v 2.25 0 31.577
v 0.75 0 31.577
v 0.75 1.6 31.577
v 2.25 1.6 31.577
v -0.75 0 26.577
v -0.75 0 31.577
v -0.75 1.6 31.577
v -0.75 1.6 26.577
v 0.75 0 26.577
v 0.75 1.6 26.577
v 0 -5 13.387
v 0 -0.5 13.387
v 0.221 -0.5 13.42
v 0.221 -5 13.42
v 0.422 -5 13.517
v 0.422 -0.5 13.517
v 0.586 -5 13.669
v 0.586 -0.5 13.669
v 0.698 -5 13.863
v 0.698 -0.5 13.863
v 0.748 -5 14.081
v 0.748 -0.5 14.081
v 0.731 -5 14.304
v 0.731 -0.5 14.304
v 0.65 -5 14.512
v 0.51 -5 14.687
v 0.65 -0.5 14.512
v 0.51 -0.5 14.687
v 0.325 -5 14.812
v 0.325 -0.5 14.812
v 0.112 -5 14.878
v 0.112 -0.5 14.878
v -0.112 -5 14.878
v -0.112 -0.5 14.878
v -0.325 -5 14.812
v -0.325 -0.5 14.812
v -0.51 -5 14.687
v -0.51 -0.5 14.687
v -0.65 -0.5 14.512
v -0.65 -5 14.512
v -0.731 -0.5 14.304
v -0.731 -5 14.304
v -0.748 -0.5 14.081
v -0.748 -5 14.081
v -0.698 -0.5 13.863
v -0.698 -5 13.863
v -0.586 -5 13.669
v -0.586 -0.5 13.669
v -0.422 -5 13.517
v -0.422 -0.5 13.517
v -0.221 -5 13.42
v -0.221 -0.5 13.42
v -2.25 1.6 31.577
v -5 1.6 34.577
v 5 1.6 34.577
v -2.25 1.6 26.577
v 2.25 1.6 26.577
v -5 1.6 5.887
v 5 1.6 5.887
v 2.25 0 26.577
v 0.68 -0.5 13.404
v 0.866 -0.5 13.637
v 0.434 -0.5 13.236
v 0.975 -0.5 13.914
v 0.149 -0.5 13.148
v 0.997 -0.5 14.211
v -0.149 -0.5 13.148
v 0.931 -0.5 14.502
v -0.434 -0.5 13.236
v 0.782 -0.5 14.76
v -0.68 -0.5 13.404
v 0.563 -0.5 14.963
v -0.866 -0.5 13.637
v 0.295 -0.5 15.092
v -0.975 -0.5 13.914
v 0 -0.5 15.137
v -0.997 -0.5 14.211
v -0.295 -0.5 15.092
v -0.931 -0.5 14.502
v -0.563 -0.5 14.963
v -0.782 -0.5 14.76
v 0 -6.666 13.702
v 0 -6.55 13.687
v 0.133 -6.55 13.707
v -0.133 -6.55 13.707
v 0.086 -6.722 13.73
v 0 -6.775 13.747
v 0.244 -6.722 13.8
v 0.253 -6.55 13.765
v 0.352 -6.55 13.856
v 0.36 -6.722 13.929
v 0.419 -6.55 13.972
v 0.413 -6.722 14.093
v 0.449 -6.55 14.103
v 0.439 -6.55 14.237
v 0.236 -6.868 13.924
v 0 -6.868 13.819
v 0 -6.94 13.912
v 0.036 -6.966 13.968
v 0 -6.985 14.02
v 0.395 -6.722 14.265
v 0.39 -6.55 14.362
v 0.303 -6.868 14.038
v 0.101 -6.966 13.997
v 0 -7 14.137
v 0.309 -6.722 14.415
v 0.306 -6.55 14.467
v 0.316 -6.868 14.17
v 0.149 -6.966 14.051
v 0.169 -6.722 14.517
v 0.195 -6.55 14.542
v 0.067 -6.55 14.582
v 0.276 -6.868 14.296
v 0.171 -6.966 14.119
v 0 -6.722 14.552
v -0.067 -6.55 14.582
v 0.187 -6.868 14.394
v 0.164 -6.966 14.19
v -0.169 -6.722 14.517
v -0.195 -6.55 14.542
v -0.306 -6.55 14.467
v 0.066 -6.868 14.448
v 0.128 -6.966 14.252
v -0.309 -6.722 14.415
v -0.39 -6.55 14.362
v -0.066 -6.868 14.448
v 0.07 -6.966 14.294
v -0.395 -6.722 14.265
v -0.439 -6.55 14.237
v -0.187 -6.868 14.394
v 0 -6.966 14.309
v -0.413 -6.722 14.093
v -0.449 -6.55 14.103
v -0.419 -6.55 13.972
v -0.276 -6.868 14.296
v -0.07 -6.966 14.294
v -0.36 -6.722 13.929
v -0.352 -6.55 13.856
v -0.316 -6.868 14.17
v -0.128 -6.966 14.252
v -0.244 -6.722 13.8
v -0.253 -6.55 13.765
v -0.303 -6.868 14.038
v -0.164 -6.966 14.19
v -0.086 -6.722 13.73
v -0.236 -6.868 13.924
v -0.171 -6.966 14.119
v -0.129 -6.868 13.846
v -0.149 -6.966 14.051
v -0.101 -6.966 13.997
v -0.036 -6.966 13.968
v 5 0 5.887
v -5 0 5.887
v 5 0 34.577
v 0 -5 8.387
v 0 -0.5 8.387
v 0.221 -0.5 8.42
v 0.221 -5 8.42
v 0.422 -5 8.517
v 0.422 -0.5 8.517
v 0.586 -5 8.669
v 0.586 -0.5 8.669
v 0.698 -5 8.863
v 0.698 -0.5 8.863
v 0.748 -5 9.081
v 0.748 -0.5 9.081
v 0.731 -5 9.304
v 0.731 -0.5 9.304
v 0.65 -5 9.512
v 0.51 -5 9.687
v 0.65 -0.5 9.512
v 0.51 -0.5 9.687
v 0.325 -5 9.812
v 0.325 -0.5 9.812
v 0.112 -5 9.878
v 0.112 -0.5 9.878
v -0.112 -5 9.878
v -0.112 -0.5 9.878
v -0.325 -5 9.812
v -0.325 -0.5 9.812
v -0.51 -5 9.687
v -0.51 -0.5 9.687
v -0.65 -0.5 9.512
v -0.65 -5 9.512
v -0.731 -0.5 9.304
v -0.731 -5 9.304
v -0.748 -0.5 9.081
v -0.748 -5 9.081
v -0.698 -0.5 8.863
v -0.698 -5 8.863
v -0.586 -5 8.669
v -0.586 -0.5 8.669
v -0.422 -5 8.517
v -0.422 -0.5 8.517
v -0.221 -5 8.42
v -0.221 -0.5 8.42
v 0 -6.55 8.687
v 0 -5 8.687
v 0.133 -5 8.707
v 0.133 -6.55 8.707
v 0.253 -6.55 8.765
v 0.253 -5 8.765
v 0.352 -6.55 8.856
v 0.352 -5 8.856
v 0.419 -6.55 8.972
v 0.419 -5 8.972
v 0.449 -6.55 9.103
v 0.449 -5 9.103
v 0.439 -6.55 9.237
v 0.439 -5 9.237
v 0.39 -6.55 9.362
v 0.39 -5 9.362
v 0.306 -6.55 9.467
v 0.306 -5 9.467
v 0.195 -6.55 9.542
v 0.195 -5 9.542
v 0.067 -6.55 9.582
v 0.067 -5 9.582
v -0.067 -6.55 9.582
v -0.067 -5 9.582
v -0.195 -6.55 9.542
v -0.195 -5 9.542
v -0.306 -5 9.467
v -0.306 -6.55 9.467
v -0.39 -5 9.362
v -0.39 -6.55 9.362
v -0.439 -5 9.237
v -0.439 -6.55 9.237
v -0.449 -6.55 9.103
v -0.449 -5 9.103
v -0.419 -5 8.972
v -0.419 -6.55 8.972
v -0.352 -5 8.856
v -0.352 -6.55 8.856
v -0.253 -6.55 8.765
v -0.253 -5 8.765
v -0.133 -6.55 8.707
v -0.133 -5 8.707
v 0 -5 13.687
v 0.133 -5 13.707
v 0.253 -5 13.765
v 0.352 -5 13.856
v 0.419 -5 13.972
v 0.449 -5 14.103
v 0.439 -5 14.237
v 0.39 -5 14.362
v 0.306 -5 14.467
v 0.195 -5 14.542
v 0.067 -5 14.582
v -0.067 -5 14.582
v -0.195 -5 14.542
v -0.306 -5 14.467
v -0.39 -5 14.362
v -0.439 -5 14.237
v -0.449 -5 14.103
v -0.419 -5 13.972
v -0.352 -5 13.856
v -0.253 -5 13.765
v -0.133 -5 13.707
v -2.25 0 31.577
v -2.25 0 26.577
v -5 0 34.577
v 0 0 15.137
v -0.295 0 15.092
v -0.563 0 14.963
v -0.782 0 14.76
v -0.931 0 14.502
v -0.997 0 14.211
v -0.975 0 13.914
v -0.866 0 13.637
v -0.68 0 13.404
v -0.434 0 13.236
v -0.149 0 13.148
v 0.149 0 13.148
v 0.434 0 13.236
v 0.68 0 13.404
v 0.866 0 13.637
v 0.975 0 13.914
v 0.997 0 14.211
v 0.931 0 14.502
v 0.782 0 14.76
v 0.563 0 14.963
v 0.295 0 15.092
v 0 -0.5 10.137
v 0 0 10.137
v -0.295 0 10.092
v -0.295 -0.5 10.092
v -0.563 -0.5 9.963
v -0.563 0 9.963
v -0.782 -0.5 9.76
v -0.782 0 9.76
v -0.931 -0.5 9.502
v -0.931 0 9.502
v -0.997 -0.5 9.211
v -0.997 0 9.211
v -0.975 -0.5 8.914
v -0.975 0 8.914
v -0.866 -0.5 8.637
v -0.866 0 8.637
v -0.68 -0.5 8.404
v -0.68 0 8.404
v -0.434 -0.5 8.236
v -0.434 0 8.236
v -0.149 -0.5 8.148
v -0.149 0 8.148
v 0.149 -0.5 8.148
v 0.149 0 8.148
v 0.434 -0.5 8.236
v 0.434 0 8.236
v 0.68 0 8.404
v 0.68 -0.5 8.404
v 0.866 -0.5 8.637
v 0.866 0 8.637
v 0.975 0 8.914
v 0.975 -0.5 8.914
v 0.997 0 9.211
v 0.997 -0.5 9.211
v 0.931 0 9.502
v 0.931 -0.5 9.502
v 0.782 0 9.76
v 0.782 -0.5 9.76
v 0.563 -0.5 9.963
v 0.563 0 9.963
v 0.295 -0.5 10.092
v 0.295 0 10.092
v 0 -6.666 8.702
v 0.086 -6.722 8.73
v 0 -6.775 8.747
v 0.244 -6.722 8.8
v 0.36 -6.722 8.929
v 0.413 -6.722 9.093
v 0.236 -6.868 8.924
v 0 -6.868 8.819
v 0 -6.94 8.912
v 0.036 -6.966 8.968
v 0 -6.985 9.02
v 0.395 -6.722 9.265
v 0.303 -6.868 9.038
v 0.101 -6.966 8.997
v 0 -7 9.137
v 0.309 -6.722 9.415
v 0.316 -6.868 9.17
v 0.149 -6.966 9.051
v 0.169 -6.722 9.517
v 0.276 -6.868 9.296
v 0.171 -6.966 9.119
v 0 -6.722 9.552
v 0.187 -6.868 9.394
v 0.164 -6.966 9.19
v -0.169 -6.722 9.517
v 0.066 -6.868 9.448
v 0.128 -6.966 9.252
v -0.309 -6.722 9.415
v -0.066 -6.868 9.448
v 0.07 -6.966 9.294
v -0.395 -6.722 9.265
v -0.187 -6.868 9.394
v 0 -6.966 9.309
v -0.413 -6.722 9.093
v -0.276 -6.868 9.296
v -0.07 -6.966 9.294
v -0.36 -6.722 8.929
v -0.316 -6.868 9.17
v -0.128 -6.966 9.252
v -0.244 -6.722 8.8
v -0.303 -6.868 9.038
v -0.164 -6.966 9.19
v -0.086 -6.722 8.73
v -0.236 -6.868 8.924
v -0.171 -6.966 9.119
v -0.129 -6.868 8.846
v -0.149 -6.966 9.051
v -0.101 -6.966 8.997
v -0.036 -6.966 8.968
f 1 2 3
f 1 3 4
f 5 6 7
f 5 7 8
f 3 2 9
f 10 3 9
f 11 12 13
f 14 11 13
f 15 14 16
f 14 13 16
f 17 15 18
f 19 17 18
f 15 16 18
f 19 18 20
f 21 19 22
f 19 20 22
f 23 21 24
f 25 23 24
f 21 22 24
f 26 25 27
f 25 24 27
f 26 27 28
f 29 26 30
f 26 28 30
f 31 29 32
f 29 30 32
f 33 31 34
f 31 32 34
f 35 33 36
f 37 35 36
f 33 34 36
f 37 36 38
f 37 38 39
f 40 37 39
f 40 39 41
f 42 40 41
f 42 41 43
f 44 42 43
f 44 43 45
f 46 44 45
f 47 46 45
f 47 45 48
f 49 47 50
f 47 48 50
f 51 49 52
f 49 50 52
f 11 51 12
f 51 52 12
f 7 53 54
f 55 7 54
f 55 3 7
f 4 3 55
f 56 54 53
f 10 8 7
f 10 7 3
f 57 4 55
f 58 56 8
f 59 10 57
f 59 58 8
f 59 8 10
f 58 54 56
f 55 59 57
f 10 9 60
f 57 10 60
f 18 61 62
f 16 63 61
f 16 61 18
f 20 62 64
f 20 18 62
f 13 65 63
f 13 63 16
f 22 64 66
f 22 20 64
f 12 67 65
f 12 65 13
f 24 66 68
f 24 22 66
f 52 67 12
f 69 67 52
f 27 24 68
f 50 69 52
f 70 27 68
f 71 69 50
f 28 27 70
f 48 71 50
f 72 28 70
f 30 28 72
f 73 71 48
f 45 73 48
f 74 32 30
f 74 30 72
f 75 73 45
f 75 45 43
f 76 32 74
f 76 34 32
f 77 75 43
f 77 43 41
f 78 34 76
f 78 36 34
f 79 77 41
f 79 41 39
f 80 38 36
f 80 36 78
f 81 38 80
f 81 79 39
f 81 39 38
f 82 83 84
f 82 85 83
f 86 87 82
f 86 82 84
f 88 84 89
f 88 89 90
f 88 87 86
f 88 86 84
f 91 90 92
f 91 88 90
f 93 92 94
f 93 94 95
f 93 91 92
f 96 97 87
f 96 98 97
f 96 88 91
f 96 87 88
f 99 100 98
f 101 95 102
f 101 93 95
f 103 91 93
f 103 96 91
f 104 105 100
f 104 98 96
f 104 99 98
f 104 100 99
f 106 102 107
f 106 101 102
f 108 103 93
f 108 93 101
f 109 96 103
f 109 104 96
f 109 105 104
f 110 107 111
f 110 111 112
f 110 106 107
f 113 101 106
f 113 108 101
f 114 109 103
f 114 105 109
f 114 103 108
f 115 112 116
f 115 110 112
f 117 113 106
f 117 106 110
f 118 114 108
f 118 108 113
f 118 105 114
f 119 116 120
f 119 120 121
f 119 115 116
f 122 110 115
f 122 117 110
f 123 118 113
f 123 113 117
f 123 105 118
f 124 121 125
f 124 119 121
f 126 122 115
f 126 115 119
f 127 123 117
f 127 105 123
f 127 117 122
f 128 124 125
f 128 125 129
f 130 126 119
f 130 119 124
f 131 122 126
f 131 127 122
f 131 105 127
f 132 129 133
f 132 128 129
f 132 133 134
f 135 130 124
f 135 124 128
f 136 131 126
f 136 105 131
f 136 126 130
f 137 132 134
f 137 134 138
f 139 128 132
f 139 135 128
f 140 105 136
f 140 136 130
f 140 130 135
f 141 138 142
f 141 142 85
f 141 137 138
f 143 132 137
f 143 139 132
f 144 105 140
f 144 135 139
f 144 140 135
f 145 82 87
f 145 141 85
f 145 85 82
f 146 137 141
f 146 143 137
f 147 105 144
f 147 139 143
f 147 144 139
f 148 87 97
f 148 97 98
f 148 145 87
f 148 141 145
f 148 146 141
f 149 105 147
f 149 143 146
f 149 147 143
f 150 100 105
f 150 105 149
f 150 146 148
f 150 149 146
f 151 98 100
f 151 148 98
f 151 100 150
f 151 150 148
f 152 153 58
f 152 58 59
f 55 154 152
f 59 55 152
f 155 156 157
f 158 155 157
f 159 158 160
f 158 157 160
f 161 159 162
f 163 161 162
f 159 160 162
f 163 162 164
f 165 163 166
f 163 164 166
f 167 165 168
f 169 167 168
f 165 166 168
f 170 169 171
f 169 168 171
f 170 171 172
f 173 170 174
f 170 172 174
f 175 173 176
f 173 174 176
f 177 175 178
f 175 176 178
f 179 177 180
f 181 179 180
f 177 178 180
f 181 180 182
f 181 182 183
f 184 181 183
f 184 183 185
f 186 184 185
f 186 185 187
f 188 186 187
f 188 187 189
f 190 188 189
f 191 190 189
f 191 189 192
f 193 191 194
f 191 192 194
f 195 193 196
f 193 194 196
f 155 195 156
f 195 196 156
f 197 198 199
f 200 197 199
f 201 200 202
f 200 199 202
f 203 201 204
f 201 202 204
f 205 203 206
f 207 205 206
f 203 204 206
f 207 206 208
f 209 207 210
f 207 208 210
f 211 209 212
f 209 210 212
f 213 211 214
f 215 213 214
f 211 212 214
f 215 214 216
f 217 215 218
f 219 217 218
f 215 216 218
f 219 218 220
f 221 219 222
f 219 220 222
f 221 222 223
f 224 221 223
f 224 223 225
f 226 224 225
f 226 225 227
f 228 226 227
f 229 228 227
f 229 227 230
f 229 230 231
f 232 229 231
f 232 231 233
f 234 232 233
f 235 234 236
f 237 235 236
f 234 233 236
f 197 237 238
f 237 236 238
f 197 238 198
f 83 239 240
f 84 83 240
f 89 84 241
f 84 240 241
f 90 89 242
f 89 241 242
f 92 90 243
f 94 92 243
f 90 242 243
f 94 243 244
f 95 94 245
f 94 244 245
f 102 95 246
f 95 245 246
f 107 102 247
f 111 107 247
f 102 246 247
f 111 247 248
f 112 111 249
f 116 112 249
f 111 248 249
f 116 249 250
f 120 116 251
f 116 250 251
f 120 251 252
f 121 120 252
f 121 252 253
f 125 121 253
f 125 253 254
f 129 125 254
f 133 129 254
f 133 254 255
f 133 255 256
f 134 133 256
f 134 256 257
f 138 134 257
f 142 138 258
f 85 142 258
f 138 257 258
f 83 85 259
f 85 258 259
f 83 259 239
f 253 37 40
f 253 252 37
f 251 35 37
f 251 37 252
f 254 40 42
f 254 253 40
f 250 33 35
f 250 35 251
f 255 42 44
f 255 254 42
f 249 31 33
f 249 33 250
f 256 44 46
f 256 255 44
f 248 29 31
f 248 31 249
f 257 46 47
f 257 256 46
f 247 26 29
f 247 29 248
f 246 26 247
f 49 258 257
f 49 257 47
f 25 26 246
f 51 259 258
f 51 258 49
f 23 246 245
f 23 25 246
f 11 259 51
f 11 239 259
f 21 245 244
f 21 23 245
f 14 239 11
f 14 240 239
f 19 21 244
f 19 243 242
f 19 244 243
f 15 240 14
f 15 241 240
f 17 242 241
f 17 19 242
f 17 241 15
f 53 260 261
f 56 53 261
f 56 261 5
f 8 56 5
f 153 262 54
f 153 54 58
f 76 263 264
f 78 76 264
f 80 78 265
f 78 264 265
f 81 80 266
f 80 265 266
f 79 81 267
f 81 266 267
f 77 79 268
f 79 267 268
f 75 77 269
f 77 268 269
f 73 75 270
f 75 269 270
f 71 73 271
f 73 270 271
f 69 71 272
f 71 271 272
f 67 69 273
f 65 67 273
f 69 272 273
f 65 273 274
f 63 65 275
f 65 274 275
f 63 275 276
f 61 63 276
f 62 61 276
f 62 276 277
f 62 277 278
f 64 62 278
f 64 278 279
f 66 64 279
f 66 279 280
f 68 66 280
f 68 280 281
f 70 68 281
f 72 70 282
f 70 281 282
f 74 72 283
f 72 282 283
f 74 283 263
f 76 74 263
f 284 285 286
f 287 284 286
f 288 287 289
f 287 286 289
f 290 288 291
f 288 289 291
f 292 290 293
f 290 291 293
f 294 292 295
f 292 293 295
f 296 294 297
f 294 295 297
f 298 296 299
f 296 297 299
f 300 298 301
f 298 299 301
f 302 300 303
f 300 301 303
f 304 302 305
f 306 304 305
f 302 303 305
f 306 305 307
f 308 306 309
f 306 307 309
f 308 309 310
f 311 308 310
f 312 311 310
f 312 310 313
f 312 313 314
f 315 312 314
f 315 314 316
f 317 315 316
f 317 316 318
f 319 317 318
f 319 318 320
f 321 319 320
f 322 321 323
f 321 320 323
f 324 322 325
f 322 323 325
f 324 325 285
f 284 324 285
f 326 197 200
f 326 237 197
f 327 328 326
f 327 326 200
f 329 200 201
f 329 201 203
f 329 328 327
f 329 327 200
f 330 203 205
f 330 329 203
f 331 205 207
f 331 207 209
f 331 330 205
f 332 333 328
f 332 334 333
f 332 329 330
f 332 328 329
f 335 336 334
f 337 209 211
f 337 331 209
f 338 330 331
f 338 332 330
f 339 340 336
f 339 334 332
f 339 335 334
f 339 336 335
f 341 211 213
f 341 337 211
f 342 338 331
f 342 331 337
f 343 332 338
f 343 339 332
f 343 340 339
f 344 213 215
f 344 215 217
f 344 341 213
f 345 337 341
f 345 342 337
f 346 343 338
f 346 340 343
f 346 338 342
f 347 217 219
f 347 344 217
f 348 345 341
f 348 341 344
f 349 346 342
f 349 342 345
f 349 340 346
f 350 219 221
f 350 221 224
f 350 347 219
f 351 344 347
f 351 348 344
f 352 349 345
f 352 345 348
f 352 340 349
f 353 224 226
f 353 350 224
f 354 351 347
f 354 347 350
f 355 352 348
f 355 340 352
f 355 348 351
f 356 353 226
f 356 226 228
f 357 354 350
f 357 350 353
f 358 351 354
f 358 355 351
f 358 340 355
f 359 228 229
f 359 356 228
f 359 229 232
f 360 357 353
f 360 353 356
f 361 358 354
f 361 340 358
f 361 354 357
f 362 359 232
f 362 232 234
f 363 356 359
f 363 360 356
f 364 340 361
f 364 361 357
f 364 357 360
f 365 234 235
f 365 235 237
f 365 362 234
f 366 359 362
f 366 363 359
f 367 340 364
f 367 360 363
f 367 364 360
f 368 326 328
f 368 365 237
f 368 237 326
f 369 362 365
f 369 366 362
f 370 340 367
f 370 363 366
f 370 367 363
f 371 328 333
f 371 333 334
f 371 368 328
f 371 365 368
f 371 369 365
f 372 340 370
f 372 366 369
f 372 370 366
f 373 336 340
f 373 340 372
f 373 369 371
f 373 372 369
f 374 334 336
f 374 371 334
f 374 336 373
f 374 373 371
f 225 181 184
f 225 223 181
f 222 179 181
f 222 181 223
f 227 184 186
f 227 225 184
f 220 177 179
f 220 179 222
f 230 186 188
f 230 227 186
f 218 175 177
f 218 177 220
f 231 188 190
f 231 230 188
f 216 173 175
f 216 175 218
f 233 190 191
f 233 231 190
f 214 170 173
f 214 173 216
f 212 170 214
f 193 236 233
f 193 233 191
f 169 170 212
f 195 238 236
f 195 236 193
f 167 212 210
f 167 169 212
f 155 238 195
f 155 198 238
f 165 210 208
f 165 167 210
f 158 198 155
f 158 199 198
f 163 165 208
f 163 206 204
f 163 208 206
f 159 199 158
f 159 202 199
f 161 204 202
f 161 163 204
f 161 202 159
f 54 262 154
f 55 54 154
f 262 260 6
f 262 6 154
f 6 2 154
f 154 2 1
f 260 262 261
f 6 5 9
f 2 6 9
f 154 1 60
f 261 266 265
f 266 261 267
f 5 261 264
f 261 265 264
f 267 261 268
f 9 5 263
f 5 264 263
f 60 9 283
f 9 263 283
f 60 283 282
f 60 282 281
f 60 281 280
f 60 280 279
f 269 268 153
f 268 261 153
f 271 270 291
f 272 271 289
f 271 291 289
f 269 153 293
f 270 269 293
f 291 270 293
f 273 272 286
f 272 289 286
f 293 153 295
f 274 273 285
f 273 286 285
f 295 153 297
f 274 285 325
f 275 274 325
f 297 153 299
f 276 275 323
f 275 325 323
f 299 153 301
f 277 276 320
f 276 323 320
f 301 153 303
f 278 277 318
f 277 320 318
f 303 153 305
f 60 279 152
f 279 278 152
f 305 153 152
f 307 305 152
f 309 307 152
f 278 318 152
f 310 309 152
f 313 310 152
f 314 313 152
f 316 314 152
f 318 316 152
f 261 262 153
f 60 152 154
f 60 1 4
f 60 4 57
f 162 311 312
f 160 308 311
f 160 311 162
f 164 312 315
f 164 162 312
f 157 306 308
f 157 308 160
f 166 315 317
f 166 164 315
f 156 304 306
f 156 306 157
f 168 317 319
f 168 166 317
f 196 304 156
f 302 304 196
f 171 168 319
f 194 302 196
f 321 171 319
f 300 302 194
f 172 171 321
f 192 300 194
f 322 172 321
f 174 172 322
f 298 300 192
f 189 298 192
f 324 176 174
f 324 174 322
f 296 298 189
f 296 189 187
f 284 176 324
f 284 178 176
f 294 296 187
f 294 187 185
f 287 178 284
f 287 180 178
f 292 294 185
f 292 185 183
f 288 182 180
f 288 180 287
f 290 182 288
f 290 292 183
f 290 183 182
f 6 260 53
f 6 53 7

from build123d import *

# Parameters (mm, degrees)
SKETCH1_W           = 10
SKETCH1_H           = 31.69
SKETCH1_W_2         = 1.5
SKETCH1_H_2         = 5
BOSS_EXTRUDE1_DEPTH = 1.6
SKETCH4_R           = 1
BOSS_EXTRUDE2_DEPTH = 0.5
SKETCH5_R           = 0.75
BOSS_EXTRUDE3_DEPTH = 4.5
SKETCH6_R           = 0.45
BOSS_EXTRUDE4_DEPTH = 2
FILLET1_R           = 0.45
SKETCH7_W           = 10
SKETCH7_H           = 3
CUT_EXTRUDE1_DEPTH  = 10


with BuildPart() as part:
    # Sketch1 → Boss-Extrude1 (new body)
    with BuildSketch(Plane(origin=(0, 0, 0), x_dir=(1, 0, 0), z_dir=(0, 1, 0))):
        with Locations((0, -21.731751346)):
            Rectangle(SKETCH1_W, SKETCH1_H)
        with Locations((1.5, -29.076751346)):
            Rectangle(SKETCH1_W_2, SKETCH1_H_2, mode=Mode.SUBTRACT)
        with Locations((-1.5, -29.076751346)):
            Rectangle(SKETCH1_W_2, SKETCH1_H_2, mode=Mode.SUBTRACT)
    extrude(amount=BOSS_EXTRUDE1_DEPTH)

    # Sketch4 → Boss-Extrude2 (add)
    with BuildSketch(Plane.XZ):
        with Locations(Location((0, 9.136751346, 0), (0, 0, 90))):
            Circle(SKETCH4_R)
        with Locations(Location((0, 14.136751346, 0), (0, 0, 90))):
            Circle(SKETCH4_R)
    extrude(amount=BOSS_EXTRUDE2_DEPTH)

    # Sketch5 → Boss-Extrude3 (add)
    with BuildSketch(Plane.XZ.offset(0.5)):
        with Locations(Location((0, 9.136751346, 0), (0, 0, 270))):
            Circle(SKETCH5_R)
        with Locations(Location((0, 14.136751346, 0), (0, 0, 270))):
            Circle(SKETCH5_R)
    extrude(amount=BOSS_EXTRUDE3_DEPTH)

    # Sketch6 → Boss-Extrude4 (add)
    with BuildSketch(Plane.XZ.offset(5)):
        with Locations(Location((0, 9.136751346, 0), (0, 0, 270))):
            Circle(SKETCH6_R)
        with Locations(Location((0, 14.136751346, 0), (0, 0, 270))):
            Circle(SKETCH6_R)
    extrude(amount=BOSS_EXTRUDE4_DEPTH)

    # Fillet1
    fillet1_edges = [part.edges().sort_by_distance(p)[0] for p in [
        (0, -7, 9.586751346),
        (0, -7, 14.586751346),
    ]]
    fillet(fillet1_edges, radius=FILLET1_R)

    # Sketch7 → Cut-Extrude1 (cut)
    with BuildSketch(Plane.XZ):
        with Locations((0, 36.076751346)):
            Rectangle(SKETCH7_W, SKETCH7_H)
    extrude(amount=-CUT_EXTRUDE1_DEPTH, mode=Mode.SUBTRACT)


solid = part.part
